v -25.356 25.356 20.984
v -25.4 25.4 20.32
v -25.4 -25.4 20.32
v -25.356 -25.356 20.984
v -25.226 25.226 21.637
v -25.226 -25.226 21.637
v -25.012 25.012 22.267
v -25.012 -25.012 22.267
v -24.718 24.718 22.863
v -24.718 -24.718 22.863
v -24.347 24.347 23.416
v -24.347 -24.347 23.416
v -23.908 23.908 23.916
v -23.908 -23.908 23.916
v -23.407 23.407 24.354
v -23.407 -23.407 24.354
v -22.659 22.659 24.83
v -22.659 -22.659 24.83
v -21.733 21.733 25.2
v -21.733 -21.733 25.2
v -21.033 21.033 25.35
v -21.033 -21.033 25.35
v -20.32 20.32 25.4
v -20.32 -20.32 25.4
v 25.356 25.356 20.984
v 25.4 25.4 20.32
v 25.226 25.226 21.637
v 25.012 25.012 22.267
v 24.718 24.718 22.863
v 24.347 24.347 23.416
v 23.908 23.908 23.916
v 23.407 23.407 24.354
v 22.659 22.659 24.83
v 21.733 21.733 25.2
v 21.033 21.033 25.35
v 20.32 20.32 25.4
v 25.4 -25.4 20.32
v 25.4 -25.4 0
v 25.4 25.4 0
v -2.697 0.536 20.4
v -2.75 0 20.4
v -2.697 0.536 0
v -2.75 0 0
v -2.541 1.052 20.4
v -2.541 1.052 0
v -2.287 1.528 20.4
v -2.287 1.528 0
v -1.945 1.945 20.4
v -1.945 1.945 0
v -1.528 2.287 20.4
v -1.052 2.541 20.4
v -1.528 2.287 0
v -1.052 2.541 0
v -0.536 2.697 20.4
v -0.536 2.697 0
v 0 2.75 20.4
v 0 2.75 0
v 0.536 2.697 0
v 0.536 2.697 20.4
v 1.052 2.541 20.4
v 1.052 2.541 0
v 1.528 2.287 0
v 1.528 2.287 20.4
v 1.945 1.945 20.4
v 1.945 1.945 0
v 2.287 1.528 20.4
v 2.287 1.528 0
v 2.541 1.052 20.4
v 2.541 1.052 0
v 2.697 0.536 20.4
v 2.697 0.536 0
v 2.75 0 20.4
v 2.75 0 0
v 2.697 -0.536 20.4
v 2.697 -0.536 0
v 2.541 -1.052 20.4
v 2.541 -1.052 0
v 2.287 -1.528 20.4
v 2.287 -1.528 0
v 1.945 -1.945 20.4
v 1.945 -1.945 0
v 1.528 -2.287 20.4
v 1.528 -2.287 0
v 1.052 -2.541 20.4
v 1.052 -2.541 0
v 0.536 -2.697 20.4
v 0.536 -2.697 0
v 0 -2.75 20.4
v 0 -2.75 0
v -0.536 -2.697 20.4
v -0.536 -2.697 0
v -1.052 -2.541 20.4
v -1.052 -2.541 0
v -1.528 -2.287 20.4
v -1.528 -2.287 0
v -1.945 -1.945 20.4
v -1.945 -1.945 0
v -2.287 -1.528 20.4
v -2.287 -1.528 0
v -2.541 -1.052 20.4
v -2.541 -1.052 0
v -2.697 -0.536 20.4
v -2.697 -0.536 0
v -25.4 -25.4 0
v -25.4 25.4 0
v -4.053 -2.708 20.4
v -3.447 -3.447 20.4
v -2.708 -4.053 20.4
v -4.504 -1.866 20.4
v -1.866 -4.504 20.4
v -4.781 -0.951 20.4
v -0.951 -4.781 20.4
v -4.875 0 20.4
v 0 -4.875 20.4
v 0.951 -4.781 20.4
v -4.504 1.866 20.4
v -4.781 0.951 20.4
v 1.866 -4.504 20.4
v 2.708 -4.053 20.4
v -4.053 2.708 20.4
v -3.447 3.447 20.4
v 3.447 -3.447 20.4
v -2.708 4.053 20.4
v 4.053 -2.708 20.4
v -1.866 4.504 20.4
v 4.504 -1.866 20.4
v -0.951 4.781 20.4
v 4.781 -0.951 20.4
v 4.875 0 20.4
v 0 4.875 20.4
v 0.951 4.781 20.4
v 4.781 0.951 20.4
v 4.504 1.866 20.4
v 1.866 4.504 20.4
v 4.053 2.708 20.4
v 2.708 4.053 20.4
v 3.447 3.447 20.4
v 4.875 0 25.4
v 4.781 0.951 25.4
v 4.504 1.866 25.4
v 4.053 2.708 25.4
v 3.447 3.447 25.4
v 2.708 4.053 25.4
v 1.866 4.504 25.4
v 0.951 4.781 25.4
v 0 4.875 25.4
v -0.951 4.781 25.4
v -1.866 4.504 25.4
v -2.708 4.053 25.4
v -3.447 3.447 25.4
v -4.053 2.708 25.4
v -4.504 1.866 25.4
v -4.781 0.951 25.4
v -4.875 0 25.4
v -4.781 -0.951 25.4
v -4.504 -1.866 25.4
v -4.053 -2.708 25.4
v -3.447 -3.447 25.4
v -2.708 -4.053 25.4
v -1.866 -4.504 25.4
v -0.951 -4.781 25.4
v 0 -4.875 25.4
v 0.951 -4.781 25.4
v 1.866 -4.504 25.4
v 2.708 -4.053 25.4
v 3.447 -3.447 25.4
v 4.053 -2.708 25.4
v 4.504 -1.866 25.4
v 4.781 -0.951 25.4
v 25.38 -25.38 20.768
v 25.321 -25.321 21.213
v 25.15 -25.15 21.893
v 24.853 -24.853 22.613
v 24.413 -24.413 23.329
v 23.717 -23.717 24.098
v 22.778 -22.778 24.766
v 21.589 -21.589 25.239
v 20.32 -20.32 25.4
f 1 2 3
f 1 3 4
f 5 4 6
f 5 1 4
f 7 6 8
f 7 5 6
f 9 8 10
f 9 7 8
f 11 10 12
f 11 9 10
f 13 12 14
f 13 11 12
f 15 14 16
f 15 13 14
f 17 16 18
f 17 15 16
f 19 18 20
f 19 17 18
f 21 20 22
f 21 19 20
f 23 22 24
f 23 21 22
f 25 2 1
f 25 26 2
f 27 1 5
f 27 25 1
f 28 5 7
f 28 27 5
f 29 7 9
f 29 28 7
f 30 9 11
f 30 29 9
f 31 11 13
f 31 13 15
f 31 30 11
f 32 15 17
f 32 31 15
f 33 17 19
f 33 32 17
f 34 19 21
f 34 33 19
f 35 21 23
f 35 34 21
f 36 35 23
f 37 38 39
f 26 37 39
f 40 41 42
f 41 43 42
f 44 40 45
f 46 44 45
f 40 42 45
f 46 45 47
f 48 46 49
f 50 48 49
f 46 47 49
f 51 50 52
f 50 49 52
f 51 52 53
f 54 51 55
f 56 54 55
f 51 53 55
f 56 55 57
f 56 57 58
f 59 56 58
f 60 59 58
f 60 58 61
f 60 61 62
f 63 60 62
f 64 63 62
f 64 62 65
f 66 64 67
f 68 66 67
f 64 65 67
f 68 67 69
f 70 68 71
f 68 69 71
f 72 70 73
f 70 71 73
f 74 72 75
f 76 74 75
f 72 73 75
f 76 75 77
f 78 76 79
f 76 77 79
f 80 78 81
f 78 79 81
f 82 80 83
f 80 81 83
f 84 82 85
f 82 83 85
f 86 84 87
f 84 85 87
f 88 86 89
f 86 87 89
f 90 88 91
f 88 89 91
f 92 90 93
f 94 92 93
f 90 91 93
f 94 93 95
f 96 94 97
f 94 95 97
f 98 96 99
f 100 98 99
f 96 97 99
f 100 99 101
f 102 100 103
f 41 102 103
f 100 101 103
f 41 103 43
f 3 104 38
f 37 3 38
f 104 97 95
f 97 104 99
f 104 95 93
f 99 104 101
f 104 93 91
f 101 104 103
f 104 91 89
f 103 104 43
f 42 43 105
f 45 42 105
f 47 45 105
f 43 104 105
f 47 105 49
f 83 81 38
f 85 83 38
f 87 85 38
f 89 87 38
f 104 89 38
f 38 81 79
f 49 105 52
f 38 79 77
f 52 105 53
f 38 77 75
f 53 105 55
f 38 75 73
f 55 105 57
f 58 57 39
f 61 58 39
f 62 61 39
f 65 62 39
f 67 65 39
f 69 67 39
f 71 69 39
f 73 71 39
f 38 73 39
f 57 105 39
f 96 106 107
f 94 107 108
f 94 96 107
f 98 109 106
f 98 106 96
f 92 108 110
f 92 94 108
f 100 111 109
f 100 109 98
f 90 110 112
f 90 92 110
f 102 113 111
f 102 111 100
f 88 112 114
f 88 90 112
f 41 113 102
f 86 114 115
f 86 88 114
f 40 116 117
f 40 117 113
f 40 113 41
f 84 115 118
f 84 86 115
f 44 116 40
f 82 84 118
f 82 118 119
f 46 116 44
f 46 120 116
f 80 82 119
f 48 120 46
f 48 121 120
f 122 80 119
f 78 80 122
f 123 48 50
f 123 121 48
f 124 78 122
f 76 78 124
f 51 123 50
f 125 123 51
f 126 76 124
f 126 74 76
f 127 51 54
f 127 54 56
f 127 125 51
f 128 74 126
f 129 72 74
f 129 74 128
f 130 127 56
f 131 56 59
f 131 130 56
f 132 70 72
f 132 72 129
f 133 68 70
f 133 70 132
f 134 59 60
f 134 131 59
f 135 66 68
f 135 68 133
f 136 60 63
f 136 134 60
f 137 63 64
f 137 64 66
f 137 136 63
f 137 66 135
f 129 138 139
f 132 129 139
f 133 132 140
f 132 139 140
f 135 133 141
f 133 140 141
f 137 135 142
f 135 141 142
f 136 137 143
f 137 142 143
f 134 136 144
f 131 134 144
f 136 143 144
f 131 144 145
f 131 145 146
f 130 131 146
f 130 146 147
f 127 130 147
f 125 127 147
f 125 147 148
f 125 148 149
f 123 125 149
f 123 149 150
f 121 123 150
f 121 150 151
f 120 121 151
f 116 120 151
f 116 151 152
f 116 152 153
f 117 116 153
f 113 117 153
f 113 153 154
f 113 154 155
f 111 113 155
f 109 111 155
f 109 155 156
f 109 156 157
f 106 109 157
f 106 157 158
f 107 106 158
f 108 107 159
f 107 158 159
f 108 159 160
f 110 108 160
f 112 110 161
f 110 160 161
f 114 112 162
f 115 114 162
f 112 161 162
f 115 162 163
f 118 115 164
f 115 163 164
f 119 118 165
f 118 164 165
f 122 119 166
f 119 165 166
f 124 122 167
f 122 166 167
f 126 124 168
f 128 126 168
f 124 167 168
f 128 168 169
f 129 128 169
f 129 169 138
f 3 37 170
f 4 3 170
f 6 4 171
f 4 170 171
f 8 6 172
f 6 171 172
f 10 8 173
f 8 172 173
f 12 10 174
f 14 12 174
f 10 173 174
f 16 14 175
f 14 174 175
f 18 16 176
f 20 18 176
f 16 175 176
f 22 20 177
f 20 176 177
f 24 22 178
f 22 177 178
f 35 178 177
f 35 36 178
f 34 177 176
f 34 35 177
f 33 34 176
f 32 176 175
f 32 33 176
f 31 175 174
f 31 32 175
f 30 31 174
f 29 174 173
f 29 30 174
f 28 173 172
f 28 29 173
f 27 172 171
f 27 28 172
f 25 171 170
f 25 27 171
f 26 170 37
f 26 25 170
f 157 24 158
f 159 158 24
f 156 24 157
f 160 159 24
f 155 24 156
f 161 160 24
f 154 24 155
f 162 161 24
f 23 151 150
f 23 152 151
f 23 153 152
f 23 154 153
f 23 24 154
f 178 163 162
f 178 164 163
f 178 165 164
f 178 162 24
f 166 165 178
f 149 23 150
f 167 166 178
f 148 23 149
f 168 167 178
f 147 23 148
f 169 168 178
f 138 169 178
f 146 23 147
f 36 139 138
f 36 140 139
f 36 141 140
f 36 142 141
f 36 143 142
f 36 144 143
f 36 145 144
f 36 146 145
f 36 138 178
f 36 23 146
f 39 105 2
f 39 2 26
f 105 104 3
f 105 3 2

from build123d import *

# Parameters (mm, degrees)
F0_W           = 50.8
F0_H           = 50.8
F1_DEPTH       = 25.4
F3_D           = 5.5
F3_CBORE_D     = 9.75
F3_CBORE_DEPTH = 5
F4_R           = 5.08


with BuildPart() as f1:
    # F0 (on Top) → F1 (new body)
    with BuildSketch(Plane.XY):
        Rectangle(F0_W, F0_H)
    extrude(amount=F1_DEPTH)

    # F3 (through all)
    with Locations(Plane.XY.offset(25.4)):
        with Locations((0, 0)):
            CounterBoreHole(F3_D / 2, F3_CBORE_D / 2, F3_CBORE_DEPTH)

    # F4
    f4_edges = [f1.edges().sort_by_distance(p)[0] for p in [
        (-25.4, 0, 25.4),
        (0, 25.4, 25.4),
        (25.4, 0, 25.4),
        (0, -25.4, 25.4),
    ]]
    fillet(f4_edges, radius=F4_R)


solid = f1.part
